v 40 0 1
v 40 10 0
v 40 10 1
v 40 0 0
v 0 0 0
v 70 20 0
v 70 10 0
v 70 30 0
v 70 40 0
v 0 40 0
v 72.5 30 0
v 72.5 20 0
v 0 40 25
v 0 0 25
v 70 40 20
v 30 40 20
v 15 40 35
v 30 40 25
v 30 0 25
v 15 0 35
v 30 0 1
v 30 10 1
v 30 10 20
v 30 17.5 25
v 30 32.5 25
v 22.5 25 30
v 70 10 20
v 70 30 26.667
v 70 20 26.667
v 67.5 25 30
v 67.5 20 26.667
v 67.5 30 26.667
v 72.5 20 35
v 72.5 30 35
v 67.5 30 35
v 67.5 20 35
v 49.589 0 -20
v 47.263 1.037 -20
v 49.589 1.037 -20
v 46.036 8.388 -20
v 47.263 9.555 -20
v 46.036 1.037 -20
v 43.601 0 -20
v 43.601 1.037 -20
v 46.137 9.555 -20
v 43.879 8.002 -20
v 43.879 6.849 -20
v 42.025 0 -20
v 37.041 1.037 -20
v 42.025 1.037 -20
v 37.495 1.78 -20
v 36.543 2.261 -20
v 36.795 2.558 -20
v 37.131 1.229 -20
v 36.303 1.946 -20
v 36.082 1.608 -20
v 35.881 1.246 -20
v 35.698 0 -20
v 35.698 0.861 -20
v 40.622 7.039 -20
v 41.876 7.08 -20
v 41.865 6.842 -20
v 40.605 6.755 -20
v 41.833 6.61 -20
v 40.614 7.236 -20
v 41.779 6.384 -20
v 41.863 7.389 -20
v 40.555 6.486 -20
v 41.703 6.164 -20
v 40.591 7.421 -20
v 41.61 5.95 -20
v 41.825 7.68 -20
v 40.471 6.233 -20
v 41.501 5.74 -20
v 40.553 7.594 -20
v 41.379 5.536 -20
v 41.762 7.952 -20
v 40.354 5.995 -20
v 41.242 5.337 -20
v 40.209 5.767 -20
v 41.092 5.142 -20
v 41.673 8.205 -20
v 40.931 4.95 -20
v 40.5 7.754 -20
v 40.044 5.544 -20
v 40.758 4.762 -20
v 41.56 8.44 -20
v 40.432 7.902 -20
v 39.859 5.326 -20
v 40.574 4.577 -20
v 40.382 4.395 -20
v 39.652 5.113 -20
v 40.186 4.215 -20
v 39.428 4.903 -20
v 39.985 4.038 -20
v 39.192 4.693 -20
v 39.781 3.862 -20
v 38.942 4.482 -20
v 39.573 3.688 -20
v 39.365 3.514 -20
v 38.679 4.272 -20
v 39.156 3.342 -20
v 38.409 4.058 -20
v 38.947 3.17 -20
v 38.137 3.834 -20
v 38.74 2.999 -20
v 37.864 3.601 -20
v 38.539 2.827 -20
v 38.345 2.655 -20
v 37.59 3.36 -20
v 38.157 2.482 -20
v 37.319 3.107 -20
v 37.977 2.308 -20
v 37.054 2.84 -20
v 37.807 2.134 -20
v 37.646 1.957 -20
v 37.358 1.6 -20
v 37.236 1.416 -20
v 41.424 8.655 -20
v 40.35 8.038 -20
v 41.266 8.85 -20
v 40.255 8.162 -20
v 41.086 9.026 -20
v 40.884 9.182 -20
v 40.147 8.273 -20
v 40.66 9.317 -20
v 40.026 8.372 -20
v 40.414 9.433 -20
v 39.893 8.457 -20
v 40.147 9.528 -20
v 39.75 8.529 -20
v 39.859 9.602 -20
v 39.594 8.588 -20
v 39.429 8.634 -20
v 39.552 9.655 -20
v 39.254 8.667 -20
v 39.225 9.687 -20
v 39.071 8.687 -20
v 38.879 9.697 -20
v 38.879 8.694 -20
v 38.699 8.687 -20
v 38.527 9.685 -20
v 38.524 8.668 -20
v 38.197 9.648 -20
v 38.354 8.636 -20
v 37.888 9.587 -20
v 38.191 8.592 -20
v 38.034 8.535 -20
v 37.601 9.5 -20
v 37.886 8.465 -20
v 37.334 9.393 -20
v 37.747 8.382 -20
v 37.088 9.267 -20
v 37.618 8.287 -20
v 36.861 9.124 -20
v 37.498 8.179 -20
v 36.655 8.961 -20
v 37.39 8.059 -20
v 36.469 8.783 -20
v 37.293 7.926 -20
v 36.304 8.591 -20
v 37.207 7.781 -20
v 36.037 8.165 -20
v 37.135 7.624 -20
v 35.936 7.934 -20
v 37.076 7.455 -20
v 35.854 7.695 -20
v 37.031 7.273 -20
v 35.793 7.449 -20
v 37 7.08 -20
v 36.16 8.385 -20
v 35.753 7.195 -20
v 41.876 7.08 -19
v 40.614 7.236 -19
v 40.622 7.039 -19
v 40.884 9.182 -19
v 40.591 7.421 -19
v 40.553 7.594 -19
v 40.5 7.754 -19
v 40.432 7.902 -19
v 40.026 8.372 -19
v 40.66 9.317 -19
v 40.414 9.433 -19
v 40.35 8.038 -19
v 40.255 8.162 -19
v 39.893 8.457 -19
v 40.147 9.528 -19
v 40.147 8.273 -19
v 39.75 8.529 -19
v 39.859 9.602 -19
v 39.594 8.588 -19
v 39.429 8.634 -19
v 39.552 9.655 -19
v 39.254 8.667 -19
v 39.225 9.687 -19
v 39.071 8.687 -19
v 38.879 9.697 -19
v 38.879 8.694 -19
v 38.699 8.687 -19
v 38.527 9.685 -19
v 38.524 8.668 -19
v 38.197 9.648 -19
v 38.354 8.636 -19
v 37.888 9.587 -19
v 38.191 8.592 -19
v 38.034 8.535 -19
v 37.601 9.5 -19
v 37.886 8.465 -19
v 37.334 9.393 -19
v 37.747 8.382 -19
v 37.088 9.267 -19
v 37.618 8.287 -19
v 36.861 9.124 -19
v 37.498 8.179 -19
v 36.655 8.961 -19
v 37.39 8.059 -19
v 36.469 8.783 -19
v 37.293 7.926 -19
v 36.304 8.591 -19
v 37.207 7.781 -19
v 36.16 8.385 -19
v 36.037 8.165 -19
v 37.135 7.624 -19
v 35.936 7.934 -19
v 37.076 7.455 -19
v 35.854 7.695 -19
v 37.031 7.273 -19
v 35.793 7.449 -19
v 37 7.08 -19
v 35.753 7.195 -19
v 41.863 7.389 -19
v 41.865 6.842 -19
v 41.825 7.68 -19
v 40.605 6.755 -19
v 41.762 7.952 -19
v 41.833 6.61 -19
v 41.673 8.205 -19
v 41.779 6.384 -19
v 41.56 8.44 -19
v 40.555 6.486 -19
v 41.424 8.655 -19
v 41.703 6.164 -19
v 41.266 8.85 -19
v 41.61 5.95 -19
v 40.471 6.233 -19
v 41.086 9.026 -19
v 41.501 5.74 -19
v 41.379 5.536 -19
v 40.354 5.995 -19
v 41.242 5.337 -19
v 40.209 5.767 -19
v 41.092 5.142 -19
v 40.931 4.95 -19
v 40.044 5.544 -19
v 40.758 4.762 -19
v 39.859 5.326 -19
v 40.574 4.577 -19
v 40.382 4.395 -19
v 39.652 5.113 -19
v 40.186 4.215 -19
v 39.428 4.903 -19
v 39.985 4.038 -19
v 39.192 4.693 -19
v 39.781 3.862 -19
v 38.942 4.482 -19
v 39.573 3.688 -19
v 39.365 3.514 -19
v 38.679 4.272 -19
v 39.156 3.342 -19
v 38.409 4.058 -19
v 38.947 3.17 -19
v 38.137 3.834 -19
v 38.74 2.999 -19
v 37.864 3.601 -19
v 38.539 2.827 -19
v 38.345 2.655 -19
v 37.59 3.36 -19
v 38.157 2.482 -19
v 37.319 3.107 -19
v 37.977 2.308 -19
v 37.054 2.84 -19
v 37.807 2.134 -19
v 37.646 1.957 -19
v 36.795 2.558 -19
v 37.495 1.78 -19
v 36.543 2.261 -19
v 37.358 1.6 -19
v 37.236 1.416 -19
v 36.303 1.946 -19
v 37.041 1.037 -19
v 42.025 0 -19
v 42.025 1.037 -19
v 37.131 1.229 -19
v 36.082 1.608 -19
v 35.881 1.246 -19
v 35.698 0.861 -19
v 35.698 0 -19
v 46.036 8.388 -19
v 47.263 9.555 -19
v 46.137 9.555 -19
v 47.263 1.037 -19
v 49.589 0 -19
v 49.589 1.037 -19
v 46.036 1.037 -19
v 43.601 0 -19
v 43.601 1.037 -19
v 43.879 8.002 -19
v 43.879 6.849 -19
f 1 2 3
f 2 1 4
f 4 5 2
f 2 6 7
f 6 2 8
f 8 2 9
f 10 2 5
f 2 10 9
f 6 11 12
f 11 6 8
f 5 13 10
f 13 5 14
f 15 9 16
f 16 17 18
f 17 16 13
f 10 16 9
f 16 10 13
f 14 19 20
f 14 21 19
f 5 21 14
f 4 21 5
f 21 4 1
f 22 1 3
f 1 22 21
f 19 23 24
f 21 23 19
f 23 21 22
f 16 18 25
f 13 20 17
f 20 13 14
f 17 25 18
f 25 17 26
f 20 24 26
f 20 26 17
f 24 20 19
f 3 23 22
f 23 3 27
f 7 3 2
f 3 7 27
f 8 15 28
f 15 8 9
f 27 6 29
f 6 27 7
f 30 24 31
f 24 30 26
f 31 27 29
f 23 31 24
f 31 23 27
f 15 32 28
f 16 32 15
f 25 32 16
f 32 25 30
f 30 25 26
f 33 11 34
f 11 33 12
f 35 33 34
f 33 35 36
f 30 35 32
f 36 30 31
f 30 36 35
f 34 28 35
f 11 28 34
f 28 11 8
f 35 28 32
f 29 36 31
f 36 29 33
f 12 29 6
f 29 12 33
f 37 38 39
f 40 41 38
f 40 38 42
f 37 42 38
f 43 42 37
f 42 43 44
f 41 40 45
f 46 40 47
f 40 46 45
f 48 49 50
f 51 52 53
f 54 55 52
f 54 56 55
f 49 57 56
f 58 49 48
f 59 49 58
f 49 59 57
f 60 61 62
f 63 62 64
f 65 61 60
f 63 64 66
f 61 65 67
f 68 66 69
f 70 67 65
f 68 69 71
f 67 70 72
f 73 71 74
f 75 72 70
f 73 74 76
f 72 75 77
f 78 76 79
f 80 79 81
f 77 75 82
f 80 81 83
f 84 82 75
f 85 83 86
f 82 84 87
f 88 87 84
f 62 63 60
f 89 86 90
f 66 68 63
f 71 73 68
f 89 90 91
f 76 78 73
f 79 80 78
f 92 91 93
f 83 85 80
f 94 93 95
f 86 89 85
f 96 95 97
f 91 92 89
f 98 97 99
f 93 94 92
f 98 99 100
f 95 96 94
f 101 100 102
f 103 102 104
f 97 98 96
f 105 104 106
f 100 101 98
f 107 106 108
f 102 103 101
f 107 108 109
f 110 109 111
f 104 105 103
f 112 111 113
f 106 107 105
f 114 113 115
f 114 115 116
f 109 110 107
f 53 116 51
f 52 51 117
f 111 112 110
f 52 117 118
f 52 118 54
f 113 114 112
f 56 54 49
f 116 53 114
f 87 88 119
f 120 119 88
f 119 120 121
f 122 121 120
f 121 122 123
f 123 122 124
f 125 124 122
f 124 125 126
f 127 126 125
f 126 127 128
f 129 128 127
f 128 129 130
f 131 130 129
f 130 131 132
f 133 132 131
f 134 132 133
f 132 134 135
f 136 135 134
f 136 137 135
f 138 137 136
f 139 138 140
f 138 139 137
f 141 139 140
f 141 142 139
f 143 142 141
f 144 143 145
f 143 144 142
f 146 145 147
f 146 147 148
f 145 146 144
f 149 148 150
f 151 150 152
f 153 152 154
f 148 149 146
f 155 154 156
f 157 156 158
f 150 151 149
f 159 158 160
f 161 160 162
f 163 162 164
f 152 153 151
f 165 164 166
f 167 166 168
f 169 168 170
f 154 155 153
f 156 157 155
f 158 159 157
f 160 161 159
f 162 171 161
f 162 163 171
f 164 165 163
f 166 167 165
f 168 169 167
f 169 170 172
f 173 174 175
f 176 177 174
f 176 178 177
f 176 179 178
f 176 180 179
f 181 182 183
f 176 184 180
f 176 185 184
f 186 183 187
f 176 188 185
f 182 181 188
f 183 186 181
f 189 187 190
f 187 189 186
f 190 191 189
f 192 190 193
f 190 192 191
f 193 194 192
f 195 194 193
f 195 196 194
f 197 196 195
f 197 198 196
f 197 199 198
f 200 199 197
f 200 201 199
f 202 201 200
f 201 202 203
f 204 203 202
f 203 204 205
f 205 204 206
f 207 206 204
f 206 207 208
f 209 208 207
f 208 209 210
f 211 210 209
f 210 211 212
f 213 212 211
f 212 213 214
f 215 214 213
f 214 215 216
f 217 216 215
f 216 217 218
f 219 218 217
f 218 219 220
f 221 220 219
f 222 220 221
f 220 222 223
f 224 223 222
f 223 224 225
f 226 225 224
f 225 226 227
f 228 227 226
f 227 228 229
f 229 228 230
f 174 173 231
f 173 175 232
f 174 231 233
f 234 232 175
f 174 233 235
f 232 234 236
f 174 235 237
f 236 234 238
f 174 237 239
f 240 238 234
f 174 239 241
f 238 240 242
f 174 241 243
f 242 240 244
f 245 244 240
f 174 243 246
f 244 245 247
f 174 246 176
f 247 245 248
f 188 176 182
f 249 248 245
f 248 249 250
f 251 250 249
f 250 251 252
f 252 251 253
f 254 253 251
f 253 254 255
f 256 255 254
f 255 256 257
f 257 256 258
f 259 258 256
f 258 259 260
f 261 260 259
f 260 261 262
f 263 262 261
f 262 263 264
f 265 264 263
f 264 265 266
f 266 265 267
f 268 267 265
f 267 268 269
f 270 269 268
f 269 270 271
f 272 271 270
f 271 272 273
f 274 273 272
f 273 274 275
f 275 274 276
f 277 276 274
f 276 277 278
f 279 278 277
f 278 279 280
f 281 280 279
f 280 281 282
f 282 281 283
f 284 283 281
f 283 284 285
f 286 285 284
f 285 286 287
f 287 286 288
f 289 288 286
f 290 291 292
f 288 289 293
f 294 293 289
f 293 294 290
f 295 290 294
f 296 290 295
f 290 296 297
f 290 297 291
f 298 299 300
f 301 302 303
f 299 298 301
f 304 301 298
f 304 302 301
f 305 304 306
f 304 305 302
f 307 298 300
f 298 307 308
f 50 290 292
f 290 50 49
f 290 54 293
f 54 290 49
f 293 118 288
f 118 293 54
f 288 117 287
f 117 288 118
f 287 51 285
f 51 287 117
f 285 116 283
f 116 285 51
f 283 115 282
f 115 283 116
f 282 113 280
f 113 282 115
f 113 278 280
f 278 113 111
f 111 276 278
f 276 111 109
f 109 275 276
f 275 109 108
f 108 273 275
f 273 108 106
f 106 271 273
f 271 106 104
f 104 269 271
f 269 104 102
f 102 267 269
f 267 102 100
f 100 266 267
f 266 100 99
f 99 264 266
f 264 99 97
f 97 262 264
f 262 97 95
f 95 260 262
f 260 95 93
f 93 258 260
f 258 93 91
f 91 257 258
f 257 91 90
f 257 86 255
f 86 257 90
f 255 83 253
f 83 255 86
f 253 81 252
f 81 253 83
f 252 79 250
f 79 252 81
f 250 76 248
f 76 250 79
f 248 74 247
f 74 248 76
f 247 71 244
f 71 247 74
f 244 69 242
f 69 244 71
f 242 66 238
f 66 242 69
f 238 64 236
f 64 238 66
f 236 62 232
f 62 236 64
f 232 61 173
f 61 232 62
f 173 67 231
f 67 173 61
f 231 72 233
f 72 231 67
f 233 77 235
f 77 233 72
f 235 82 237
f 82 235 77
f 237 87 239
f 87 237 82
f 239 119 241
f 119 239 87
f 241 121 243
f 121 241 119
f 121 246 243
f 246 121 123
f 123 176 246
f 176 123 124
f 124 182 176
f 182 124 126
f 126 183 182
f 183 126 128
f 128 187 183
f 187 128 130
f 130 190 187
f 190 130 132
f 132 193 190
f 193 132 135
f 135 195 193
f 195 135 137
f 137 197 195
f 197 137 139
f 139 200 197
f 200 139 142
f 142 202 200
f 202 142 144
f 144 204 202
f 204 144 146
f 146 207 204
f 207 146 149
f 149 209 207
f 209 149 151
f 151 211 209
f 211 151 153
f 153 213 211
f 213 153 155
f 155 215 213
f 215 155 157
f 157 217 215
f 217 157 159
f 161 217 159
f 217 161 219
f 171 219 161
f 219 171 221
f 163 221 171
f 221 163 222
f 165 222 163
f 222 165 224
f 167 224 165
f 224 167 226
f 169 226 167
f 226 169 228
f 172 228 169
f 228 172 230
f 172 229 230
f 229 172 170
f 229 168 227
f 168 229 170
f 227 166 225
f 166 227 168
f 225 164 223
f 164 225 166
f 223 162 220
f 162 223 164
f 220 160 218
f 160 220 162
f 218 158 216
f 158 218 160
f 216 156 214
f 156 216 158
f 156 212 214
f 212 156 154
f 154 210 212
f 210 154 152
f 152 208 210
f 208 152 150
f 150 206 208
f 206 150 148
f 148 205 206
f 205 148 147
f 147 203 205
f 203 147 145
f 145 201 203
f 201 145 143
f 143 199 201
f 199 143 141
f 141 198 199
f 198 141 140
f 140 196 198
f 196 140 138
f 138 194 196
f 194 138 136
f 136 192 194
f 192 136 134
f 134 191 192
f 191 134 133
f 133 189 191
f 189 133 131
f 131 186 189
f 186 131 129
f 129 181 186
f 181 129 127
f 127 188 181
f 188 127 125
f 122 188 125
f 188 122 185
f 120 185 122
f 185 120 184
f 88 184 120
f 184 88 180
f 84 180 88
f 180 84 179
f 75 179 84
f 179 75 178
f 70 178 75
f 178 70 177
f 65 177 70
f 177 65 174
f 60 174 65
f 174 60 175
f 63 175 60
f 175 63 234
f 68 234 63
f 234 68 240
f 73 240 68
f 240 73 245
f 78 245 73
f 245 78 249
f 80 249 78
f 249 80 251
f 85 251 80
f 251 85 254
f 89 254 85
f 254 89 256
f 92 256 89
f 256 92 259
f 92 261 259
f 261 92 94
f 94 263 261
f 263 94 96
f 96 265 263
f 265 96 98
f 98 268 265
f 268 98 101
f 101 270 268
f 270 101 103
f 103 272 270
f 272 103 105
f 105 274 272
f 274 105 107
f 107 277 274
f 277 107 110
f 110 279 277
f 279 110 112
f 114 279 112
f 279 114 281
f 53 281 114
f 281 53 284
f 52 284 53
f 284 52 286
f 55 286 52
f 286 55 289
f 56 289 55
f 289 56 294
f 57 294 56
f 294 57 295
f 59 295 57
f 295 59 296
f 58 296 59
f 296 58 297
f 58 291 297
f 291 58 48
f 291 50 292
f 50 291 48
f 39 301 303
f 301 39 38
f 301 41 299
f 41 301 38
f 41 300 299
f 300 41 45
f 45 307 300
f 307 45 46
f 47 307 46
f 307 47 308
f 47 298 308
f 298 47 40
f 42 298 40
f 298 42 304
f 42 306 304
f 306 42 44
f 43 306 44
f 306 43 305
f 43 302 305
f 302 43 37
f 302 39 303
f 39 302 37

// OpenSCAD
// file: lib.scad
module wedge(w=[0,0],d=[0,0],h=[0,0],r=[0,0,0]) {
    rotate([r[0],r[1],r[2]])
    polyhedron(
       points=[[w[0],d[1],h[1]],
               [w[0],d[0],h[1]],
               [w[0],d[0],h[0]],
               [w[0],d[1],h[0]],
               [w[1],d[1],h[0]],
               [w[1],d[0],h[0]]
               ],
        faces=[[3,2,0],
               [0,2,1],
               [5,4,0],
               [5,0,1],
               [4,2,3],
               [4,5,2],
               [4,3,0],
               [1,2,5]
               ]);
}

module fname(name="default", width) {
    translate([width/2,0,-20])
    linear_extrude(height=1)
    text(name);
}
// main file
use <lib.scad>;

cw=70;
cd=40;
c2h=30;
ch=35;
roof1h=ch-10;

union() {
    difference() {
        cube([40, cd, ch]);
        translate([30,0,1])
        cube([10, cd, ch-1]);
        wedge([0,15],[cd,0],[ch,roof1h]);
        translate([15*2,0,0])
        mirror([1,0,0])
        wedge([0,15],[cd,0],[ch,roof1h]);
    }
    
    translate([70,10,0])
    rotate([0,0,90])
    difference() {
        cube([30,50,c2h]);
        wedge([0,15],[50,0],[c2h,c2h-10]);
        translate([15*2,0,0])
        mirror([1,0,0])
        wedge([0,15],[50,0],[c2h,c2h-10]);
    }
    translate([cw-(5/2),20,0])
    cube([5,10,ch]);
}

fname("21",cw);
